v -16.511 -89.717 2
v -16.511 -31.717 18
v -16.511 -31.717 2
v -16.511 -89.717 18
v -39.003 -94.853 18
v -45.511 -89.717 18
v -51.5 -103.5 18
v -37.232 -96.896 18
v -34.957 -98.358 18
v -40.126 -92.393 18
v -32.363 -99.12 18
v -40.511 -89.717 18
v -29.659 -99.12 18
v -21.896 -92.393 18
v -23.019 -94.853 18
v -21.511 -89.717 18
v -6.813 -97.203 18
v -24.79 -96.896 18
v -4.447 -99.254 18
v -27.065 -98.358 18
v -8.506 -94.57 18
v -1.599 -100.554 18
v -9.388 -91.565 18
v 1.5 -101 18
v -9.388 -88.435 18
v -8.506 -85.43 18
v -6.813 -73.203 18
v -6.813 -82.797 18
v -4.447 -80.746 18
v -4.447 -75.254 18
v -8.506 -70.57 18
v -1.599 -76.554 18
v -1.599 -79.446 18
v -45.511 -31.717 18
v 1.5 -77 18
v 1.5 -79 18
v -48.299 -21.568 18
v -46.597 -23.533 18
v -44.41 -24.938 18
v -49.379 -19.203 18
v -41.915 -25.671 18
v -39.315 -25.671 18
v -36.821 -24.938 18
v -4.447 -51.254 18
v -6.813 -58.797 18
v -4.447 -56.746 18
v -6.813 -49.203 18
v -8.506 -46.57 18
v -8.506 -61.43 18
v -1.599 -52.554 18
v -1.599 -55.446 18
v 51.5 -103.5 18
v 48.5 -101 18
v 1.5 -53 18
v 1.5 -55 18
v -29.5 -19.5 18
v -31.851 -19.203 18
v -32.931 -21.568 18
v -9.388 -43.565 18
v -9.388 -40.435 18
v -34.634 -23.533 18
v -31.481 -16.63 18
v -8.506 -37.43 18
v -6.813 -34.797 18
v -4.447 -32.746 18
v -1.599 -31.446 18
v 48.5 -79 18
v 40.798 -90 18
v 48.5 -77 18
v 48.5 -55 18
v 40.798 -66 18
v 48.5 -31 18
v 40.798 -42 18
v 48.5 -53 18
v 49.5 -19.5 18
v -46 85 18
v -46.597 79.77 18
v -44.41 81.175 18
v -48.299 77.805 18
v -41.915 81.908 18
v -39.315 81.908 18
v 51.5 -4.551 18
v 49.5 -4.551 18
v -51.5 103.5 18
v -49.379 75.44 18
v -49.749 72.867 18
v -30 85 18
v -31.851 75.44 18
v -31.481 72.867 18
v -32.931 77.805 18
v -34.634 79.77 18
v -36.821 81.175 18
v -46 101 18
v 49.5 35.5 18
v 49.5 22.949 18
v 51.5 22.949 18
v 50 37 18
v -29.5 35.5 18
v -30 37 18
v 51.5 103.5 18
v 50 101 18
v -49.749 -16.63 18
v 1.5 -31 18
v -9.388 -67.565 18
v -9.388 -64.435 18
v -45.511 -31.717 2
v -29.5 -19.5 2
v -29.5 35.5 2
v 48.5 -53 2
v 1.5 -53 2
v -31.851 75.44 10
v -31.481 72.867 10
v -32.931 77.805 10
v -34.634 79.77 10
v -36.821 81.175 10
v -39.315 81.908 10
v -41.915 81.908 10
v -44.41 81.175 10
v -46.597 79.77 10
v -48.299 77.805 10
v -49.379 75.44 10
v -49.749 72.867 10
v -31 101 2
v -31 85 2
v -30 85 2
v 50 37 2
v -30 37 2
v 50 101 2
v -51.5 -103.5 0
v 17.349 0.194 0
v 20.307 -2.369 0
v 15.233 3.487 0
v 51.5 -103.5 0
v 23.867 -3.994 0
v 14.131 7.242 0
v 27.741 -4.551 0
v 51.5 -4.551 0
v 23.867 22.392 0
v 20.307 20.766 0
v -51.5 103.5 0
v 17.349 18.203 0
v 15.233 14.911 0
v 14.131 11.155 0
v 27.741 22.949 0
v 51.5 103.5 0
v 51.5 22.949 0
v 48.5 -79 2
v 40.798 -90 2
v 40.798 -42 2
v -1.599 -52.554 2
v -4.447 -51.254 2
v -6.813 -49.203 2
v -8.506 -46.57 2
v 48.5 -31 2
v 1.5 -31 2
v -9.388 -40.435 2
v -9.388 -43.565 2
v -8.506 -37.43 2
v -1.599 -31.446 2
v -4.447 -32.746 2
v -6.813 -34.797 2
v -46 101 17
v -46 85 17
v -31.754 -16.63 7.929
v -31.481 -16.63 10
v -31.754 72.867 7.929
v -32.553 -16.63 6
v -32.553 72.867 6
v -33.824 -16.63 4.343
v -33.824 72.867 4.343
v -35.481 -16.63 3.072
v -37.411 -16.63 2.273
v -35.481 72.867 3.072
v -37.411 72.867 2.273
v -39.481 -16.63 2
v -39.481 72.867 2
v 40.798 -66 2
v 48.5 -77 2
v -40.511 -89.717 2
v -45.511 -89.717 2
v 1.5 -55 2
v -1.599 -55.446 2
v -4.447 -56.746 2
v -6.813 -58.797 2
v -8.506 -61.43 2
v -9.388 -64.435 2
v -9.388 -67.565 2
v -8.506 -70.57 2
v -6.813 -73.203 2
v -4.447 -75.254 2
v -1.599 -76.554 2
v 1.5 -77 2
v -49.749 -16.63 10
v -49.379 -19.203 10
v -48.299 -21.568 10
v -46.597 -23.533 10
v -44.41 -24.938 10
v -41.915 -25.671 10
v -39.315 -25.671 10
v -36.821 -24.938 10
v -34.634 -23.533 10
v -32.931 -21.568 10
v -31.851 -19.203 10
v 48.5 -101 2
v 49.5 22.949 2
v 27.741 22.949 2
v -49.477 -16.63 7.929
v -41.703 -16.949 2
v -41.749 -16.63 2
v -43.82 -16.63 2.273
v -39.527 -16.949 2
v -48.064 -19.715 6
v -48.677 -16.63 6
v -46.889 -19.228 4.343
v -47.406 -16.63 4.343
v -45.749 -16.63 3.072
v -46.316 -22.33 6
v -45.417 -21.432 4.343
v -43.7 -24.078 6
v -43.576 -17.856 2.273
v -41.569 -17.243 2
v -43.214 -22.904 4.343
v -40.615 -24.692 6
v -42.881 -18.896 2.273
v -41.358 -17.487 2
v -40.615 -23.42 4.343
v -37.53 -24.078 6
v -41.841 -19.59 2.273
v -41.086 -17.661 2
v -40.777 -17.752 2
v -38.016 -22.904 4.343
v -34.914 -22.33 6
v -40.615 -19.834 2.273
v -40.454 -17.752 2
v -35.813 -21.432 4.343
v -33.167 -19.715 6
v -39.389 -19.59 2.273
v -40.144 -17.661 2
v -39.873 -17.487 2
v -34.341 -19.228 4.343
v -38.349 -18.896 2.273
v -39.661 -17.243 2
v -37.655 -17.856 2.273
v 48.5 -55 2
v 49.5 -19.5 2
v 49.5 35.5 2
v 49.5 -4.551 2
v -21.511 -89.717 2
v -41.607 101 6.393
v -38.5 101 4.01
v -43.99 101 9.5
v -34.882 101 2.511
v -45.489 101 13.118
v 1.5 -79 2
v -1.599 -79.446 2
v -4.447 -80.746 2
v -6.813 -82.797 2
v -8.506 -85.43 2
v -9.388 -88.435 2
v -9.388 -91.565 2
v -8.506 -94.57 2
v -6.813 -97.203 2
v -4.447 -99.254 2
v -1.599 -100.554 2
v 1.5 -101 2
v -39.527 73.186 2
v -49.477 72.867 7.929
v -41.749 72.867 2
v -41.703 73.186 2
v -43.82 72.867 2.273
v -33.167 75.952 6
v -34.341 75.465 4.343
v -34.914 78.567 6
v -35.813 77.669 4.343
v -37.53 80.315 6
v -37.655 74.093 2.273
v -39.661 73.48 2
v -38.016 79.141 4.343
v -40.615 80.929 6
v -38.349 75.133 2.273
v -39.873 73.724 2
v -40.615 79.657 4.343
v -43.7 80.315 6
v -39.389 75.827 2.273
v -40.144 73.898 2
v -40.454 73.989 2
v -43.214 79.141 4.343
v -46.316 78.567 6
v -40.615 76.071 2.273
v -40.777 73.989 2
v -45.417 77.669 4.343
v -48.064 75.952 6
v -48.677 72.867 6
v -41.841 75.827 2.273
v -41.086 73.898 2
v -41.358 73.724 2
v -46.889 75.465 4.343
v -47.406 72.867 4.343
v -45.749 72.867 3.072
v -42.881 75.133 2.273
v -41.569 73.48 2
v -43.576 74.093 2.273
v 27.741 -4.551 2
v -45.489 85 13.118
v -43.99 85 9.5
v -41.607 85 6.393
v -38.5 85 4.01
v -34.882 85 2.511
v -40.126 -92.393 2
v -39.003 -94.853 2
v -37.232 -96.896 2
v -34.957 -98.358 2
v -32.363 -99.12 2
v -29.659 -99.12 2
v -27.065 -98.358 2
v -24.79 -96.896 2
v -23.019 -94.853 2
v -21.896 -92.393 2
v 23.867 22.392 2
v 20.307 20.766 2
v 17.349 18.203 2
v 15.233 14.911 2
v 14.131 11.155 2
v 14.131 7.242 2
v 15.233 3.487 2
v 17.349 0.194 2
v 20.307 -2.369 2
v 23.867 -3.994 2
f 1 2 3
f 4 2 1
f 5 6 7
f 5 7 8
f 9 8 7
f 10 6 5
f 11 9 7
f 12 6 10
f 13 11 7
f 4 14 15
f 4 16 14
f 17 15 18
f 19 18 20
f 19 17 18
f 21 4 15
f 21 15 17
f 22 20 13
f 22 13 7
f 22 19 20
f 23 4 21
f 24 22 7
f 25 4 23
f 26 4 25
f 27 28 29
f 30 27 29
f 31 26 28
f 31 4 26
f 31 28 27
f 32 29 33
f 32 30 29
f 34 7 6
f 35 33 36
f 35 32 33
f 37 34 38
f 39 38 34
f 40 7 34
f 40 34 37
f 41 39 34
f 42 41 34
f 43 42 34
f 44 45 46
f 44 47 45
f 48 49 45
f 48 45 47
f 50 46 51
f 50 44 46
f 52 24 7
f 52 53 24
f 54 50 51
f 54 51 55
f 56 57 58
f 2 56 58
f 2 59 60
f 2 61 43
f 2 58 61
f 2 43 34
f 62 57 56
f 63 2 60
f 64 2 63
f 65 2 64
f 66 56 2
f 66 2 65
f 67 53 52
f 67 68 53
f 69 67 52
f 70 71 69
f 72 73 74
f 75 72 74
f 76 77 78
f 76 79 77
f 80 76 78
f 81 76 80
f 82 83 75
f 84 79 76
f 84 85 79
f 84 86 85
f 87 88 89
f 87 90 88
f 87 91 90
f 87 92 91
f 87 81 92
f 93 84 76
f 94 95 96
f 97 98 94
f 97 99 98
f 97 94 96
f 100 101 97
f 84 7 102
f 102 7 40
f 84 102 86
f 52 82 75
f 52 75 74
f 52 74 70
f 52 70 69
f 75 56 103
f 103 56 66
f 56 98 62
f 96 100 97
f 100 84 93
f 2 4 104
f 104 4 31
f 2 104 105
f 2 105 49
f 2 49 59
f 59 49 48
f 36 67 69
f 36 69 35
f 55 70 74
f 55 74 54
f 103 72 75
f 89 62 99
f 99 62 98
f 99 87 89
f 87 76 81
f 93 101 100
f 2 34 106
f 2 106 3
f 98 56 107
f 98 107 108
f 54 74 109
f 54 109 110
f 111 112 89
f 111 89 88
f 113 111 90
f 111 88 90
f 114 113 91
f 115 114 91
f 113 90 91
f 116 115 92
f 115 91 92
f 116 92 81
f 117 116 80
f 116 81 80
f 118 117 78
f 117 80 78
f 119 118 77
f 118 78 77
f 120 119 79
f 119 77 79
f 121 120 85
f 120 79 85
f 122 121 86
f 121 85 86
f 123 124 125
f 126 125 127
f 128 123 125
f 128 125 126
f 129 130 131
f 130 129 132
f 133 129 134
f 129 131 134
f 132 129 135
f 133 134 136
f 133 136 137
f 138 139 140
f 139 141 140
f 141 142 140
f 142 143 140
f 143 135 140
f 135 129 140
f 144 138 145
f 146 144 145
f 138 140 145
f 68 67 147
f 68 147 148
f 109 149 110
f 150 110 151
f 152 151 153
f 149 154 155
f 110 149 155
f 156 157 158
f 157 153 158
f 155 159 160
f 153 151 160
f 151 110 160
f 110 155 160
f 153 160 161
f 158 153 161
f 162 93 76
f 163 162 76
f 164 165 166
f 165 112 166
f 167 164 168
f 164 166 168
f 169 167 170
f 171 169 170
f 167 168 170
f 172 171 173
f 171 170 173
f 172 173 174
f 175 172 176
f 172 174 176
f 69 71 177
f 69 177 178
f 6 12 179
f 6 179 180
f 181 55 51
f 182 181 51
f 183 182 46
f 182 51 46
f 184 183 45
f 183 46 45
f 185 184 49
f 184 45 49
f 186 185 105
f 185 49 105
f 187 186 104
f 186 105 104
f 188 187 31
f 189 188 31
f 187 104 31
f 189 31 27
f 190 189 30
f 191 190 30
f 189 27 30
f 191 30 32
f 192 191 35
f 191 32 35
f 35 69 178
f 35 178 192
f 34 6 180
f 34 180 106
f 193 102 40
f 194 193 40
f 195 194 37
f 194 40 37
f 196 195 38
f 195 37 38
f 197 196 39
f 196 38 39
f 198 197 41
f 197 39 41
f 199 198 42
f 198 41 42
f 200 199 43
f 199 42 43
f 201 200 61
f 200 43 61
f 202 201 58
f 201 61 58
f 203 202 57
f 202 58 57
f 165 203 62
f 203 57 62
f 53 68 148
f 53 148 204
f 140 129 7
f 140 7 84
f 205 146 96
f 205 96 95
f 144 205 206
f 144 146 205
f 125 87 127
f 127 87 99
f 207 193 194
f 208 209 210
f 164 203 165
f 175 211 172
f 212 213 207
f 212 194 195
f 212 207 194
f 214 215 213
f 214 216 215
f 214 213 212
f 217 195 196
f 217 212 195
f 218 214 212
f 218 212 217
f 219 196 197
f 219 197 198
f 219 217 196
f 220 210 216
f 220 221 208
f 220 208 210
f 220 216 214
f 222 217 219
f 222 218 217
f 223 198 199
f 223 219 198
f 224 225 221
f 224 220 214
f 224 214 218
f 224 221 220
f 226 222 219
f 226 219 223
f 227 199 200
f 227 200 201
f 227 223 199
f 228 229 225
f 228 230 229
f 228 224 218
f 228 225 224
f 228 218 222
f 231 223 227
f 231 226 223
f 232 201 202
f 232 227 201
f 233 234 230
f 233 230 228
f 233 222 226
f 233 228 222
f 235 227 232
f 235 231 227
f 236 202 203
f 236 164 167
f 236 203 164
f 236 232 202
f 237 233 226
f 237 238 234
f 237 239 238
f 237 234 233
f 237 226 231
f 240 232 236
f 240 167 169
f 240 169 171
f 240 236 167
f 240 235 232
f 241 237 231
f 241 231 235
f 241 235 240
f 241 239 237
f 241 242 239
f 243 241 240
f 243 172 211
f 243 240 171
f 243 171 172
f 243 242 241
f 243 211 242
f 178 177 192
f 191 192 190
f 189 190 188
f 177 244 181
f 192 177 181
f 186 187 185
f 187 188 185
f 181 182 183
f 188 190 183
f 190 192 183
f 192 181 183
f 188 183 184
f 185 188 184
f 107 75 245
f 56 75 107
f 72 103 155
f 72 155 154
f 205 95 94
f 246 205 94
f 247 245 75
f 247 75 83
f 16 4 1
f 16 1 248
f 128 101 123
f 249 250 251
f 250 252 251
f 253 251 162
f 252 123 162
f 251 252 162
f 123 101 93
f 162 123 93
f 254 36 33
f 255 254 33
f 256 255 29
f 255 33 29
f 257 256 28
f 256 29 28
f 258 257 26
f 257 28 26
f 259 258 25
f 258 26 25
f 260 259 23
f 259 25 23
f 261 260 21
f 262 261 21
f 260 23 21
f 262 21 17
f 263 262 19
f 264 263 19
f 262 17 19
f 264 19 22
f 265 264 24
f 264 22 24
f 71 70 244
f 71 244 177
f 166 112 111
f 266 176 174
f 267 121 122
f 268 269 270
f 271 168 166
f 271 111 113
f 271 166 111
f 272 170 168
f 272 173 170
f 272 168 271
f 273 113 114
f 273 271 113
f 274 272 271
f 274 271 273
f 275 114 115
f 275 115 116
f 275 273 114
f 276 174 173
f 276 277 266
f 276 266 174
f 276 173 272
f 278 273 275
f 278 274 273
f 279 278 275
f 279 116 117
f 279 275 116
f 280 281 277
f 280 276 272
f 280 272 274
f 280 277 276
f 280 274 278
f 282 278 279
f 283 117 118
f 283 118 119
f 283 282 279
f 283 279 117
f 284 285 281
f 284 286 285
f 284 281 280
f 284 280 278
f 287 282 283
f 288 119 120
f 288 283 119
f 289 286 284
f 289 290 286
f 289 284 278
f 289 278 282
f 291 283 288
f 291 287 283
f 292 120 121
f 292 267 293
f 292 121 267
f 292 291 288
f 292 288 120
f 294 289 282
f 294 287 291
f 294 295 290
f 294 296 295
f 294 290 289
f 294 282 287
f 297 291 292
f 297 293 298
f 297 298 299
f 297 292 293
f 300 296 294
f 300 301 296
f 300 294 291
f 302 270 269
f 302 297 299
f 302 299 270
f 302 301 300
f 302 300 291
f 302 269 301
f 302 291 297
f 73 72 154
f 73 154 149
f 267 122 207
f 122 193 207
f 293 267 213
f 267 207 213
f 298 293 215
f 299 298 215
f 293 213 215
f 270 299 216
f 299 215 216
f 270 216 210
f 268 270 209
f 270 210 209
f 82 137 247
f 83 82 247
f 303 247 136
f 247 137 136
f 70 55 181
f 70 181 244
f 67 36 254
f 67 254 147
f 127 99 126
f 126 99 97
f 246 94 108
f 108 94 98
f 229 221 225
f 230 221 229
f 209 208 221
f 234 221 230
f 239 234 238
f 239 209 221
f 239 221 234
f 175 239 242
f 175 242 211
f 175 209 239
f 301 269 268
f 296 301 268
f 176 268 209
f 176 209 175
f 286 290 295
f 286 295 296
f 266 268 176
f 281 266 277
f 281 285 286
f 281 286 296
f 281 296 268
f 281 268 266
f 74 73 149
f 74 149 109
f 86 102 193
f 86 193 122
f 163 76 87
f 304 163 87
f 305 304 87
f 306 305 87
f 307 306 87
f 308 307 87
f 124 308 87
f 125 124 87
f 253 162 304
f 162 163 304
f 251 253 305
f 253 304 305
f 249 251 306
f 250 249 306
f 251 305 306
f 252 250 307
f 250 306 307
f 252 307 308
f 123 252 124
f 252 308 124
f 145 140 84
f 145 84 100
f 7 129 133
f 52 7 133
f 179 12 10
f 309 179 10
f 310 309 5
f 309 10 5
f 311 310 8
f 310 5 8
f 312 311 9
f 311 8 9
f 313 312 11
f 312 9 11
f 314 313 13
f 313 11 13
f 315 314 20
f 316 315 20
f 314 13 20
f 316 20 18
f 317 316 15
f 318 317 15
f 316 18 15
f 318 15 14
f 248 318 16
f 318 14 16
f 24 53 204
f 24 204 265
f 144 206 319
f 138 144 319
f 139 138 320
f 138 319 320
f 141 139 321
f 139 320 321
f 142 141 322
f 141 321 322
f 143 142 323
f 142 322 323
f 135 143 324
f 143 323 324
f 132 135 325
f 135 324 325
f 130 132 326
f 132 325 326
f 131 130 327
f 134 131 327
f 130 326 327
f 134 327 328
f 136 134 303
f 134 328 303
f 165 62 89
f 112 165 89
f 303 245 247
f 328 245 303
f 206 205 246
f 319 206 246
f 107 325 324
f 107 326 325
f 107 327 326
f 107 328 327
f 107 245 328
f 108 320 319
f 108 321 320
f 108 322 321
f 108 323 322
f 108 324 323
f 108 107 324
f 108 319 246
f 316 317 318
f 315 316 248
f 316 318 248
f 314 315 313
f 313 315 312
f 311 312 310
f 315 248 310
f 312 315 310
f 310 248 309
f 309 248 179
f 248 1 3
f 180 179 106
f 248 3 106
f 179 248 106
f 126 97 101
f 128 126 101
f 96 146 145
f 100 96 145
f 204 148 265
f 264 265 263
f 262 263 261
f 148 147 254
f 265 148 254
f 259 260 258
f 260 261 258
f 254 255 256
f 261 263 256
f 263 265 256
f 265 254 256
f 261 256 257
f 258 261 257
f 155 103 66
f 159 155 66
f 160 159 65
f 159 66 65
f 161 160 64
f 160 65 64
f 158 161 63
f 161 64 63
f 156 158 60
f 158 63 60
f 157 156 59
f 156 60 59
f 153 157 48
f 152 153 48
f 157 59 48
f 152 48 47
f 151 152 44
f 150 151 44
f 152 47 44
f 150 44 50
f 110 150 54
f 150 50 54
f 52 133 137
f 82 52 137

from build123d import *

# Parameters (mm, degrees)
SKETCH032_W            = 103
SKETCH032_H            = 207
PAD009_DEPTH           = 18
POCKET017_DEPTH        = 16
SKETCH034_W            = 55
SKETCH034_H            = 79
POCKET018_DEPTH        = 16
POCKET019_DEPTH        = 16
LINEARPATTERN002_COUNT = 3
LINEARPATTERN002_PITCH = 24
POCKET020_DEPTH        = 16
POCKET021_DEPTH        = 16
FILLET008_R            = 8
FILLET009_R            = 15
POCKET022_DEPTH        = 5
POCKET022_DEPTH_BACK   = 100


with BuildPart() as part:
    # Sketch032 → Pad009 (new body)
    with BuildSketch(Plane.XY):
        Rectangle(SKETCH032_W, SKETCH032_H)
    extrude(amount=PAD009_DEPTH)

    # Sketch029 (on Face6 of Pad009) → Pocket017 (cut)
    with BuildSketch(Plane(origin=(10, 69, 18), x_dir=(1, 0, 0), z_dir=(0, 0, 1))):
        Polygon((-40, -32), (40, -32), (40, 32), (-40, 32), (-56, 32), (-56, 16), (-40, 16), align=None)
    extrude(amount=-POCKET017_DEPTH, mode=Mode.SUBTRACT)

    # Sketch034 → Pocket018 (cut)
    with BuildSketch(Plane(origin=(-52, 30, 18), x_dir=(0, 1, 0), z_dir=(0, 0, 1))):
        with Locations((-22, -62)):
            Rectangle(SKETCH034_W, SKETCH034_H)
    extrude(amount=-POCKET018_DEPTH, mode=Mode.SUBTRACT)

    # Sketch030 → Pocket019 (cut)
    with BuildSketch(Plane(origin=(25, -90, 18), x_dir=(1, 0, 0), z_dir=(0, 0, 1))):
        with BuildLine():
            Line((-23.5, 11), (23.5, 11))
            Line((23.5, 11), (15.797717, 0))
            Line((15.797717, 0), (23.5, -11))
            Line((23.5, -11), (-23.5, -11))
            ThreePointArc((-23.5, 11), (-34.5, 0), (-23.5, -11))
        make_face()
    pocket019 = extrude(amount=-POCKET019_DEPTH, mode=Mode.SUBTRACT)

    # LinearPattern002: Pocket019 ×3
    with Locations(*[(0, i * LINEARPATTERN002_PITCH, 0) for i in range(1, LINEARPATTERN002_COUNT)]):
        add(pocket019, mode=Mode.SUBTRACT)

    # Sketch031 → Pocket020 (cut)
    with BuildSketch(Plane(origin=(-68, -55, 18), x_dir=(1, 0, 0), z_dir=(0, 0, 1))):
        with BuildLine():
            Line((51.488981, 23.283394), (51.488981, -34.716606))
            Line((51.488981, -34.716606), (46.488981, -34.716606))
            ThreePointArc((27.488981, -34.716606), (36.988981, -44.216606), (46.488981, -34.716606))
            Line((27.488981, -34.716606), (22.488981, -34.716606))
            Line((22.488981, -34.716606), (22.488981, 23.283394))
            Line((22.488981, 23.283394), (51.488981, 23.283394))
        make_face()
    extrude(amount=-POCKET020_DEPTH, mode=Mode.SUBTRACT)

    # Sketch033 → Pocket021 (cut)
    with BuildSketch(Plane(origin=(-60, 120, 18), x_dir=(1, 0, 0), z_dir=(0, 0, 1))):
        with BuildLine():
            ThreePointArc((10.250873, -136.6297), (19.384811, -145.763638), (28.518749, -136.6297))
            Line((28.518749, -136.6297), (28.518749, -47.133303))
            ThreePointArc((28.518749, -47.133303), (19.384811, -37.999364), (10.250873, -47.133303))
            Line((10.250873, -136.6297), (10.250873, -47.133303))
        make_face()
    extrude(amount=-POCKET021_DEPTH, mode=Mode.SUBTRACT)

    # Fillet008
    fillet008_edges = [part.edges().sort_by_distance(p)[0] for p in [
        (-40.615189, 82.000636, 2),
    ]]
    fillet(fillet008_edges, radius=FILLET008_R)

    # Fillet009
    fillet009_edges = [part.edges().sort_by_distance(p)[0] for p in [
        (-46, 93, 2),
    ]]
    fillet(fillet009_edges, radius=FILLET009_R)

    # Sketch035 → Pocket022 (cut, two sides)
    with BuildSketch(Plane(origin=(50, -35, 2), x_dir=(0, 1, 0), z_dir=(0, 0, 1))) as pocket022_sk:
        with BuildLine():
            ThreePointArc((30.448608, -4.073936), (44.198608, -17.823936), (57.948608, -4.073936))
            Line((57.948608, -4.073936), (57.948608, 22.259397))
            ThreePointArc((57.948608, 22.259397), (44.198608, 36.009397), (30.448608, 22.259397))
            Line((30.448608, -4.073936), (30.448608, 22.259397))
        make_face()
    extrude(amount=-POCKET022_DEPTH, mode=Mode.SUBTRACT)
    extrude(pocket022_sk.sketch, amount=POCKET022_DEPTH_BACK, mode=Mode.SUBTRACT)


solid = part.part
